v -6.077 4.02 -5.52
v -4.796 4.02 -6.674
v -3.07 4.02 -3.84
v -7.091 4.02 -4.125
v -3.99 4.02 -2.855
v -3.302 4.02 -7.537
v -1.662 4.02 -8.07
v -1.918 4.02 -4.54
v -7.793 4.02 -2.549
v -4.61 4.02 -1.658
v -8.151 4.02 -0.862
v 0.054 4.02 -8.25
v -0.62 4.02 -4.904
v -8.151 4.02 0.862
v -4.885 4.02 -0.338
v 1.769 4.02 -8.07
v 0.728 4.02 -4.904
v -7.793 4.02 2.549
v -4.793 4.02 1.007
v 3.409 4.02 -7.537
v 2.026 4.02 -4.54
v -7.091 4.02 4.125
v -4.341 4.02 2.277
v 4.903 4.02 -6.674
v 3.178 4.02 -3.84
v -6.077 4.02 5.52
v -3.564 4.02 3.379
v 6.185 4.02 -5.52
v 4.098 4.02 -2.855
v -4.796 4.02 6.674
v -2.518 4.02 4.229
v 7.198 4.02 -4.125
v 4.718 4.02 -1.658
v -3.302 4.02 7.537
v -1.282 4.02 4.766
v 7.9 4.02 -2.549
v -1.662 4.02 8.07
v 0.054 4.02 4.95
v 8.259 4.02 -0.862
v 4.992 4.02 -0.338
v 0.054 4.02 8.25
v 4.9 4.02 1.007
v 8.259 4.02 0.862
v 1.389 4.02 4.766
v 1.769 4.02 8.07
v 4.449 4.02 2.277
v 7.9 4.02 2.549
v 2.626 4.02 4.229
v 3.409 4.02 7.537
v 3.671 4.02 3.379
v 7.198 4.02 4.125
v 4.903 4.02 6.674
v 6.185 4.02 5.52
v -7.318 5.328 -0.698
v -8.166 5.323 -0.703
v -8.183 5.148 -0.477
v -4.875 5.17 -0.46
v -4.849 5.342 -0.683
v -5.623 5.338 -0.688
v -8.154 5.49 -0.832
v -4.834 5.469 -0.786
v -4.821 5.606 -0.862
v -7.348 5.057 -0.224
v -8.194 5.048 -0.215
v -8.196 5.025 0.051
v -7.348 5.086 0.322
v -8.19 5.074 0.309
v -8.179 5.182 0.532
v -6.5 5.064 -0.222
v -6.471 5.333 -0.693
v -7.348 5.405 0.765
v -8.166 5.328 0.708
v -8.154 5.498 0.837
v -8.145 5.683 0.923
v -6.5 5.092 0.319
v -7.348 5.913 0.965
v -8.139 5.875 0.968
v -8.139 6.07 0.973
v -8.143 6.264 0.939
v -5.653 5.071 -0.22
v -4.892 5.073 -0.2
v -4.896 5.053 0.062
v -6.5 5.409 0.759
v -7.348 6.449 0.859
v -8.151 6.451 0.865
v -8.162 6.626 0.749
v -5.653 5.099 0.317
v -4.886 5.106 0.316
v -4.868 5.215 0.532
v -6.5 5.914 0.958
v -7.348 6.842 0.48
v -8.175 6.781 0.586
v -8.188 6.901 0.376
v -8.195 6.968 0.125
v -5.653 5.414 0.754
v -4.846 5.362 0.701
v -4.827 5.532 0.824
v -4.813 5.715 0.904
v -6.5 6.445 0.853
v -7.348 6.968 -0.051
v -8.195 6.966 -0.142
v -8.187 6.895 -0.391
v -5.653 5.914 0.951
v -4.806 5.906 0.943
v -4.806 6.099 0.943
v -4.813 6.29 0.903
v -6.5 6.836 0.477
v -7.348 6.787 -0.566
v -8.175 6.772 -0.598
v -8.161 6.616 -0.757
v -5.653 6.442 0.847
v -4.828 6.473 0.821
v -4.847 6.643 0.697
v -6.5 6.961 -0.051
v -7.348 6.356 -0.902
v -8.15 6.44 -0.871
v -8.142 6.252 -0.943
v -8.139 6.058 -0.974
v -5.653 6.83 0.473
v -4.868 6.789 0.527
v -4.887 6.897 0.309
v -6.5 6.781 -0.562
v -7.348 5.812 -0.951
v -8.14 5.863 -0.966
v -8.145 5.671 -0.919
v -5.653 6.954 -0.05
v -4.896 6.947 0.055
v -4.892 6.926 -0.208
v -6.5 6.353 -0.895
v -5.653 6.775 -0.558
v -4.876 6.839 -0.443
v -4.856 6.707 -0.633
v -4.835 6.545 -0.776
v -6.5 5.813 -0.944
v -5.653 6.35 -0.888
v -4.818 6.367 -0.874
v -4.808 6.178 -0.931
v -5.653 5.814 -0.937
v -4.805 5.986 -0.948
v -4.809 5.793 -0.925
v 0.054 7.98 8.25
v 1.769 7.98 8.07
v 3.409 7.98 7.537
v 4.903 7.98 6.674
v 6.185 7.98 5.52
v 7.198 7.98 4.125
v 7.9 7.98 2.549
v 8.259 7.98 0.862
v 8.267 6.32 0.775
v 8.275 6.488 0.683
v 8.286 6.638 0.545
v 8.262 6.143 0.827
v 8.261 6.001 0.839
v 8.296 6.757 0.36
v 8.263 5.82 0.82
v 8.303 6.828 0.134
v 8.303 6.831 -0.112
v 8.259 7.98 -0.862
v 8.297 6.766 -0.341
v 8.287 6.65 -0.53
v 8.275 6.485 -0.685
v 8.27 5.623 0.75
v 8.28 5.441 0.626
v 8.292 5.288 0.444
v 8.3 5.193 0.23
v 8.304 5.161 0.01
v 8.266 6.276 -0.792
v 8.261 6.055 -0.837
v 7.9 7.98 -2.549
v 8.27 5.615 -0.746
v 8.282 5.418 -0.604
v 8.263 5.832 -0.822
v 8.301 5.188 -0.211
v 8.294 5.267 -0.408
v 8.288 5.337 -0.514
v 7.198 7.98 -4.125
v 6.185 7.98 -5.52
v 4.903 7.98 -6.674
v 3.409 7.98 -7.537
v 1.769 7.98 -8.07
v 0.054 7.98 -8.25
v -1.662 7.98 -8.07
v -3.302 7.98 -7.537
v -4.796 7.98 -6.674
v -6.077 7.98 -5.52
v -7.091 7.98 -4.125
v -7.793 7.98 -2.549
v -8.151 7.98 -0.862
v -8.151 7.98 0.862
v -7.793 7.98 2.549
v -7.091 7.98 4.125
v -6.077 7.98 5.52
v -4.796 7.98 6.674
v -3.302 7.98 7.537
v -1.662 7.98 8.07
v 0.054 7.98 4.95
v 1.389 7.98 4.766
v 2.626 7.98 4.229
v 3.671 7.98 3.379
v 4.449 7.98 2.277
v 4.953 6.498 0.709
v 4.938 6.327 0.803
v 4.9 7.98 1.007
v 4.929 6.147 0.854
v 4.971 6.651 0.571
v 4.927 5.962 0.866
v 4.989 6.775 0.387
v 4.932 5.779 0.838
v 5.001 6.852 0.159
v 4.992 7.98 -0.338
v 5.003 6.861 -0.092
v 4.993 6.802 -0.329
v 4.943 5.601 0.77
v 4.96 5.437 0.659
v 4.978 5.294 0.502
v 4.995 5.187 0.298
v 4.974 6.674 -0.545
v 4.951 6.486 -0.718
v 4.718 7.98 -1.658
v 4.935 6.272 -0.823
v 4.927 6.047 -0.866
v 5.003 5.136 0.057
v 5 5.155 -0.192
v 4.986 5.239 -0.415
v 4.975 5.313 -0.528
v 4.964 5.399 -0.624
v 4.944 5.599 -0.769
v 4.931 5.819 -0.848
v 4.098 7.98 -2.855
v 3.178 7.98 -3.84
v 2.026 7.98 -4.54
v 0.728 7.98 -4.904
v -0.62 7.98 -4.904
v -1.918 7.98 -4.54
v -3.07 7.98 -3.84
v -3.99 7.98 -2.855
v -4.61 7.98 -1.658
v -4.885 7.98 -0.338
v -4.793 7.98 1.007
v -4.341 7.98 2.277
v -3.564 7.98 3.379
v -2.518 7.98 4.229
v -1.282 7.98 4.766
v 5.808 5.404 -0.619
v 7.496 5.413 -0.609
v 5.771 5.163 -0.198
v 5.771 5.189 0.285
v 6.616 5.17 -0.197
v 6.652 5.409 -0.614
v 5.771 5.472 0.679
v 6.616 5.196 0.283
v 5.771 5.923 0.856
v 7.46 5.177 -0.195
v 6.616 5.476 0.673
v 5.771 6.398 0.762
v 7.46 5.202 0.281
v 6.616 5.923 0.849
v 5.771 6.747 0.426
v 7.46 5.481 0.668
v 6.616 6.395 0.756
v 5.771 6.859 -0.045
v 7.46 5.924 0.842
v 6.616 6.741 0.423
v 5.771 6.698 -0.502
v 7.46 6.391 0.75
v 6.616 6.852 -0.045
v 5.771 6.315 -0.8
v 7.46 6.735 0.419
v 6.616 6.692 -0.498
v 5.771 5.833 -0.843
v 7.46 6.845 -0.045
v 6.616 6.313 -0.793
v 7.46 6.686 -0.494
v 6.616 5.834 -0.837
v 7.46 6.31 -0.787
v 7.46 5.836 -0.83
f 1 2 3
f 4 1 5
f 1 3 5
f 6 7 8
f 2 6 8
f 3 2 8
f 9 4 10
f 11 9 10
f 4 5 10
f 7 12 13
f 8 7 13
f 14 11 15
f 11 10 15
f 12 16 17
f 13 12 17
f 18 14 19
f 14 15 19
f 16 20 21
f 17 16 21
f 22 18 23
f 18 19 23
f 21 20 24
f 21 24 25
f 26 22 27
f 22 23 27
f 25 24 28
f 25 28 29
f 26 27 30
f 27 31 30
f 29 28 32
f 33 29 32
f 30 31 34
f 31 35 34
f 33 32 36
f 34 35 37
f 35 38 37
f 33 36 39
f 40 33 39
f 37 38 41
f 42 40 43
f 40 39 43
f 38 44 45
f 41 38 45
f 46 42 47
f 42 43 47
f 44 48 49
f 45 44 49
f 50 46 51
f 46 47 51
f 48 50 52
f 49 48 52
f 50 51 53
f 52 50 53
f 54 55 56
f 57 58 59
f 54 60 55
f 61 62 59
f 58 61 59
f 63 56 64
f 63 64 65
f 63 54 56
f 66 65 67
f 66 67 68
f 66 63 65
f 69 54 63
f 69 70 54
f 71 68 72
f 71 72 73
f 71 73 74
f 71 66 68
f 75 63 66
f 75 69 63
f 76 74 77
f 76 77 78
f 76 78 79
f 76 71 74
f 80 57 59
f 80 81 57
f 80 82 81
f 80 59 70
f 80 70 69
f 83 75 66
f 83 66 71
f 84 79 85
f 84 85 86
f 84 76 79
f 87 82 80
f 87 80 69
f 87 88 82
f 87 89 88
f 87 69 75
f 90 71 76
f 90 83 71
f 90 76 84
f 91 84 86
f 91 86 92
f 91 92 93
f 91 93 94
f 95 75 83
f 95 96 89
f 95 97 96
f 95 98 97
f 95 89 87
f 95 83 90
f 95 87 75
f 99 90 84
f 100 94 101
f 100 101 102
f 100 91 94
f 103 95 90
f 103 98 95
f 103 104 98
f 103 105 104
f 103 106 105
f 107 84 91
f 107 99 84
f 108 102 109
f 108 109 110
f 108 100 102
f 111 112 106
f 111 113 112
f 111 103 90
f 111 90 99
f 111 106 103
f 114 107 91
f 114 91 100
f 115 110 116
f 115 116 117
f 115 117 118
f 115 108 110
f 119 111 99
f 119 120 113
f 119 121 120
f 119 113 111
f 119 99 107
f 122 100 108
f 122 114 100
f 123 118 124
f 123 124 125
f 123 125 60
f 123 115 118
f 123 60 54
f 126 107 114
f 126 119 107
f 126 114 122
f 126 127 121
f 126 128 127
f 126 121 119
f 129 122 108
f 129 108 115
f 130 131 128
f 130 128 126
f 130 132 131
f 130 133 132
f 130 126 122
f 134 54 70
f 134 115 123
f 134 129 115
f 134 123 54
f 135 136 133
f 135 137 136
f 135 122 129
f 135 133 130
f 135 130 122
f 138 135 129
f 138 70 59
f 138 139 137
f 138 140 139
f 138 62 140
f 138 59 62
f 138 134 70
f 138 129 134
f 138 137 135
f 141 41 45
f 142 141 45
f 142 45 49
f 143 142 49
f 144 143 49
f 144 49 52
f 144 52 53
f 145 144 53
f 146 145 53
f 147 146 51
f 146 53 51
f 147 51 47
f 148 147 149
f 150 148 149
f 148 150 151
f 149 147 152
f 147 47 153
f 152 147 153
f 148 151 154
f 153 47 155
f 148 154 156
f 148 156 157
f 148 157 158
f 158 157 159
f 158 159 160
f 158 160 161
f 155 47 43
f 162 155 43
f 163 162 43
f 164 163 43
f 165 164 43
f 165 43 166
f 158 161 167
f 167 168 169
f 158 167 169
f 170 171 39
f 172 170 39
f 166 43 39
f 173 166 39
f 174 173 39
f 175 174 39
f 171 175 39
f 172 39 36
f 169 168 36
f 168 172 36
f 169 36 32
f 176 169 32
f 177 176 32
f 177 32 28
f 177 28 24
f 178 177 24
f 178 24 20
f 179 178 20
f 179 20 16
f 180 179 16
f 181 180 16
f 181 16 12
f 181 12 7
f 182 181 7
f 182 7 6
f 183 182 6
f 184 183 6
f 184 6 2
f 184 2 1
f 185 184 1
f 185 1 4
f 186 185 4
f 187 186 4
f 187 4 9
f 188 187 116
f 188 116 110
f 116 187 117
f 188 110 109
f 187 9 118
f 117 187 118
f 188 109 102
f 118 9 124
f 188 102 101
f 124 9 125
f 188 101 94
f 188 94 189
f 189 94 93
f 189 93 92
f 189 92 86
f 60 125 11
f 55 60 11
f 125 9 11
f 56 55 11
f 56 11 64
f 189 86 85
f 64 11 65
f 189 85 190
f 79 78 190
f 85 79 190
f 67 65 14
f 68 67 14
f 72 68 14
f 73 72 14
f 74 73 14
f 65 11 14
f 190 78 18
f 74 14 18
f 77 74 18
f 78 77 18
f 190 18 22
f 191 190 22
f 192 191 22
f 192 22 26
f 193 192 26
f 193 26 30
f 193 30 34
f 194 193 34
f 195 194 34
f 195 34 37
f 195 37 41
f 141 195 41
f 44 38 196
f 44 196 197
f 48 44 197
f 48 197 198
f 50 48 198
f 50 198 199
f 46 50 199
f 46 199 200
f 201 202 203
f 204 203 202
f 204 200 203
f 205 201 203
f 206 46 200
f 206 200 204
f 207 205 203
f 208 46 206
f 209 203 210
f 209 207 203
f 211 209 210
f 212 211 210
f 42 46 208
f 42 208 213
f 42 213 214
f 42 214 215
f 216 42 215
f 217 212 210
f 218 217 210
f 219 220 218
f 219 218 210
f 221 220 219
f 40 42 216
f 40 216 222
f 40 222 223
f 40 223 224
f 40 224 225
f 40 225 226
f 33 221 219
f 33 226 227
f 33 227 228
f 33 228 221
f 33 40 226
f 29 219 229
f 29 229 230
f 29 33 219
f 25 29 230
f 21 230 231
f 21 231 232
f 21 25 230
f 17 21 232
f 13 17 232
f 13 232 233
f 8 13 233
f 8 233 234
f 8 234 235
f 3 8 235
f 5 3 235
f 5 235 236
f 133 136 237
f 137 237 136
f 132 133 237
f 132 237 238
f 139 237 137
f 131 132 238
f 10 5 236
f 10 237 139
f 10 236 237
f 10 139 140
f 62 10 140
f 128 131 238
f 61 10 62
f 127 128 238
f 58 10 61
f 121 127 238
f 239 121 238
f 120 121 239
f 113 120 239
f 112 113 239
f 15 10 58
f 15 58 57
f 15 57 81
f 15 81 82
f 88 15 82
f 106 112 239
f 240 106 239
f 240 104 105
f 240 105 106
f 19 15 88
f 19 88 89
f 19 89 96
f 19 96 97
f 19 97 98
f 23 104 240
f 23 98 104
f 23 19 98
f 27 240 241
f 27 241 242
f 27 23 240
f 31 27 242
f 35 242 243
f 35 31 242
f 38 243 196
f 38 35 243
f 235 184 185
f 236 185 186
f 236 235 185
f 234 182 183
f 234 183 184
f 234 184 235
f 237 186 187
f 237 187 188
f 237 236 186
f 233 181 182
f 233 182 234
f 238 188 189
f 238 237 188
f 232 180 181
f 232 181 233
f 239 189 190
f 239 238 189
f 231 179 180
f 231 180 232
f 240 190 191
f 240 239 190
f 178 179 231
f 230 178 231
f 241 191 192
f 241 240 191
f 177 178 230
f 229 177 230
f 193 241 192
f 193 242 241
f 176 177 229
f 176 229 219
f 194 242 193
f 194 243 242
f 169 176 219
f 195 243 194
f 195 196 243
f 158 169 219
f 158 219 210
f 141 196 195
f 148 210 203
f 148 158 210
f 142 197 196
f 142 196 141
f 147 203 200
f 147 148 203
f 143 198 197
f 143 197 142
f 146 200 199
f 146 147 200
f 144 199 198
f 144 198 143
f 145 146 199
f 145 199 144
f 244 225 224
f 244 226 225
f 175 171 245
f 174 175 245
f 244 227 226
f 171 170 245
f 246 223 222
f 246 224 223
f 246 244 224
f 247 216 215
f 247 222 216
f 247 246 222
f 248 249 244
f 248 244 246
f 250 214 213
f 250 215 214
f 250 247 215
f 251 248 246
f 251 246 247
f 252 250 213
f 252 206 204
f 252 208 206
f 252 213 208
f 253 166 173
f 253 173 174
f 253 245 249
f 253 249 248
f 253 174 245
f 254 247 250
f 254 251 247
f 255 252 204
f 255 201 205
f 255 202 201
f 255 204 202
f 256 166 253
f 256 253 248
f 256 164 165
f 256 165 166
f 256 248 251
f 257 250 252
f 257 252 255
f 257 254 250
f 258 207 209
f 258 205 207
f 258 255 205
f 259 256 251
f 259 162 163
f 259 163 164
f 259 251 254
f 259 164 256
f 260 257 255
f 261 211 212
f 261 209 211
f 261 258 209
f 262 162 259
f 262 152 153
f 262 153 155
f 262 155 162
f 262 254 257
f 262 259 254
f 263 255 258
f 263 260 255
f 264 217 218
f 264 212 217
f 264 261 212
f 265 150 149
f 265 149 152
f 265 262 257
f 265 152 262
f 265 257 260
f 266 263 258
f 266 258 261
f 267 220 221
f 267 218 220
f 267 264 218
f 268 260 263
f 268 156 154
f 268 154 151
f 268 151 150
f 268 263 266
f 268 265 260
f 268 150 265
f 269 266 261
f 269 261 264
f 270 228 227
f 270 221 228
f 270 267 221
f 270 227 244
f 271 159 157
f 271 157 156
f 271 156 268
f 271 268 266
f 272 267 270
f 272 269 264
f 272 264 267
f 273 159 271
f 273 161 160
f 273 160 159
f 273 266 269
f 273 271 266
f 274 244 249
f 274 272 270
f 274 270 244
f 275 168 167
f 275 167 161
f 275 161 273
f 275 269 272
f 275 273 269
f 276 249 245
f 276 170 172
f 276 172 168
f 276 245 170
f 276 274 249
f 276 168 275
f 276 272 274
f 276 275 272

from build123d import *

# Parameters (mm, degrees)
SKETCH1_R           = 25
SKETCH1_R_2         = 15
BOSS_EXTRUDE1_DEPTH = 12
SCALE1_SCALE        = 0.33


with BuildPart() as part:
    # Sketch1 → Boss-Extrude1 (new body)
    with BuildSketch(Plane(origin=(0, 0, 0), x_dir=(1, 0, 0), z_dir=(0, 1, 0))):
        with Locations(Location((0, 0, 0), (0, 0, 270))):
            Circle(SKETCH1_R)
        with Locations(Location((0, 0, 0), (0, 0, 270))):
            Circle(SKETCH1_R_2, mode=Mode.SUBTRACT)
    extrude(amount=BOSS_EXTRUDE1_DEPTH)

    # Sketch2 → Cut-Revolve1 (revolve, cut)
    with BuildSketch(Plane.XY, mode=Mode.PRIVATE) as cut_revolve1_sk:
        Polygon((30, 8.5), (30, 6), (-30, 6), (-30, 9), align=None)
    revolve(cut_revolve1_sk.sketch.rotate(Axis((30, 6, 0), (-1, 0, 0)), 133.934111216), axis=Axis((30, 6, 0), (-1, 0, 0)), mode=Mode.SUBTRACT)


with BuildPart() as part_1:
    # Scale1: scaled about (0.080152948, 5.999999597, -1.2051e-05)
    add(part.part.scale(SCALE1_SCALE).moved(Location((0.053702475, 4.01999973, -8.074e-06))))


solid = part_1.part
